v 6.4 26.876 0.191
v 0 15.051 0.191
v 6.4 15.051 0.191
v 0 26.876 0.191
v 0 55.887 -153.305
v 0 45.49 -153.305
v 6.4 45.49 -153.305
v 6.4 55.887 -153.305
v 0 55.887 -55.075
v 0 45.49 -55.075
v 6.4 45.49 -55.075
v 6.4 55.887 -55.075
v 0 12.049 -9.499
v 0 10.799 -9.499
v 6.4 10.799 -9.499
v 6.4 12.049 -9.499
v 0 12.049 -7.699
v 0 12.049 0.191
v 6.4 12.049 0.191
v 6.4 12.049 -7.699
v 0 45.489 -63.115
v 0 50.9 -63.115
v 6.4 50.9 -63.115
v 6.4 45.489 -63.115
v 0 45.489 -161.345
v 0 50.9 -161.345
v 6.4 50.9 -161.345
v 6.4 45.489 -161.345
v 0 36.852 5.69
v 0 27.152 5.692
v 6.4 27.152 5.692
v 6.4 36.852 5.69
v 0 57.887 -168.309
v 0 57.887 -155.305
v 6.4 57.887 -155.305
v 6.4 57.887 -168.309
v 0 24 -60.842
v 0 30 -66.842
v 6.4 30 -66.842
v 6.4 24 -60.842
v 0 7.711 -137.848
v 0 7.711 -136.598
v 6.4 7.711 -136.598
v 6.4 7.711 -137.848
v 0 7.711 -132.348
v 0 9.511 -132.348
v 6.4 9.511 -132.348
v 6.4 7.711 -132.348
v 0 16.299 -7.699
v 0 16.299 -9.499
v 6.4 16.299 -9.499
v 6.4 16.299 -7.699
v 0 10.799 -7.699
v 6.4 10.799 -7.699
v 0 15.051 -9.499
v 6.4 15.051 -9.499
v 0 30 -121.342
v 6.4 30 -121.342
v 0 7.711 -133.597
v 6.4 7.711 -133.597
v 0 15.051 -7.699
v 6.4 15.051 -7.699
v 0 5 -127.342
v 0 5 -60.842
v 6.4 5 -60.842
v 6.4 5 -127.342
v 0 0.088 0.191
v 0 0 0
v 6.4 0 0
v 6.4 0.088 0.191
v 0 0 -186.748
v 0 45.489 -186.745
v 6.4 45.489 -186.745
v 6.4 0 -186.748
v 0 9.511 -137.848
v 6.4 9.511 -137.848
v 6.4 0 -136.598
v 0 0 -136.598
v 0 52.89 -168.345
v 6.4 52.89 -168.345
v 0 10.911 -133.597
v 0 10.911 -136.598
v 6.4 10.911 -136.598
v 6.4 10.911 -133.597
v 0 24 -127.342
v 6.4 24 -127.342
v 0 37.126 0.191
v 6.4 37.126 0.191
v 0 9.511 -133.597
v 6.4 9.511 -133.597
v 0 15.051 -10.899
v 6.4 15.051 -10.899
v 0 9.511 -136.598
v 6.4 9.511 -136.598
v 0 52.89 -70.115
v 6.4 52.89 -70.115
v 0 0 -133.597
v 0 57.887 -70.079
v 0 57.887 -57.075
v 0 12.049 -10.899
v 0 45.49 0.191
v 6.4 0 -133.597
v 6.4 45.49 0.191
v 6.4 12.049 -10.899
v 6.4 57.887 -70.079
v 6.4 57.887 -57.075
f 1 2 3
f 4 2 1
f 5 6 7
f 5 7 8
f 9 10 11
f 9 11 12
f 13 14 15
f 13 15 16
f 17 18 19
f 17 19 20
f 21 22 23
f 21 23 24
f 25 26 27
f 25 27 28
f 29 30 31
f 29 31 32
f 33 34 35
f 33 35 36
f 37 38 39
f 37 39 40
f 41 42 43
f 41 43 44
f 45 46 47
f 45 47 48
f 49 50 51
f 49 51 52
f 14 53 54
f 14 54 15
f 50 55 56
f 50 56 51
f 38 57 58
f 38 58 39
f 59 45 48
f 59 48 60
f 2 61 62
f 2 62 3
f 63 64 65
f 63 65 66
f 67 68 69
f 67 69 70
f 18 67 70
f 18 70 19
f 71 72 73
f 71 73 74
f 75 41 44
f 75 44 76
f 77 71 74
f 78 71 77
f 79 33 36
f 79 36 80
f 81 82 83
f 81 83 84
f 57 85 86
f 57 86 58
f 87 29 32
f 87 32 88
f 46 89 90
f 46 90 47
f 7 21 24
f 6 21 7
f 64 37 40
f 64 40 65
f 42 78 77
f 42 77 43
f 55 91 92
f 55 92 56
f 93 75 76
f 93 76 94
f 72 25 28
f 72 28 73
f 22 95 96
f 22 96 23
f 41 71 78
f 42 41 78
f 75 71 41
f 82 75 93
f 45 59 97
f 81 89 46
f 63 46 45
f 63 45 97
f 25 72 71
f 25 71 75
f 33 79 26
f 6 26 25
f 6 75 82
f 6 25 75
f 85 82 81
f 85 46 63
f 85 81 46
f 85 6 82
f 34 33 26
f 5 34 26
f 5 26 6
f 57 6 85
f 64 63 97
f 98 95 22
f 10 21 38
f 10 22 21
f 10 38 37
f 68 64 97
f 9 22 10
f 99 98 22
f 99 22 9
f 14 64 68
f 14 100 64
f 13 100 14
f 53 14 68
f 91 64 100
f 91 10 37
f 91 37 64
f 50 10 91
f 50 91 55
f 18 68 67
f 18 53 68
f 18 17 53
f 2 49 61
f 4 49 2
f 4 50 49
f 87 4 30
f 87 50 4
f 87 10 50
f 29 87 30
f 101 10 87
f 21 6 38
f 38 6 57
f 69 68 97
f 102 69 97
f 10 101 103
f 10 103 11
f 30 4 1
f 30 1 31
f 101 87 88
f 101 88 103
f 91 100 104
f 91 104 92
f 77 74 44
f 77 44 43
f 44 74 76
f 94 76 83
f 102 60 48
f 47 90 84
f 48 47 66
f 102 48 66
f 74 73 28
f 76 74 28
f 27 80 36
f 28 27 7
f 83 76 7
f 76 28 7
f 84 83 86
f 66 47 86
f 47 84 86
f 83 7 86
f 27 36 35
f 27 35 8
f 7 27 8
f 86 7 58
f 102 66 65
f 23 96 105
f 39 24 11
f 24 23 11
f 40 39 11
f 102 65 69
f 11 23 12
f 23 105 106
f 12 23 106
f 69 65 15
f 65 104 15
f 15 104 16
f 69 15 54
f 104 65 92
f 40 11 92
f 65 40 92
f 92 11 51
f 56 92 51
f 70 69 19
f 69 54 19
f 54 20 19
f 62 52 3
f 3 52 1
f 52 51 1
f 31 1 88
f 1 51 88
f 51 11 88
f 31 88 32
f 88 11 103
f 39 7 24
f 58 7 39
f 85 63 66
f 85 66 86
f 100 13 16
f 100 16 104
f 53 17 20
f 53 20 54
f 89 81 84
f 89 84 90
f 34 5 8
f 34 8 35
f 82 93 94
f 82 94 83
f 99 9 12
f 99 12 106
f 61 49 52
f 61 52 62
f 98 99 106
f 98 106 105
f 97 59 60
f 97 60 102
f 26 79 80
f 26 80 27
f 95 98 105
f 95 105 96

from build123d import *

# Parameters (mm, degrees)
BOSS_EXTRUDE1_DEPTH = 6.4


with BuildPart() as part:
    # Sketch1 → Boss-Extrude1 (new body)
    with BuildSketch(Plane(origin=(0, 0, 0), x_dir=(0, 0, -1), z_dir=(1, 0, 0))):
        Polygon((7.699451661, 16.299320413), (7.699451661, 15.050679587), (-0.190789953, 15.050679587), (-0.190789953, 26.875784077), (-5.692060153, 27.152292188), (-5.689519376, 36.852291855), (-0.190789953, 37.125784431), (-0.190789953, 45.489990555), (55.075, 45.489990555), (55.075, 55.887449255), (57.075, 57.887449255), (70.079421798, 57.887449255), (70.115, 52.889990555), (63.115, 50.9), (63.115, 45.489442951), (153.305, 45.490143945), (153.305, 55.887449255), (155.305, 57.887449255), (168.309421798, 57.887449255), (168.345, 52.889990555), (161.345, 50.9), (161.345, 45.489442951), (186.745000058, 45.489442951), (186.748098344, 0), (136.598098344, 0), (136.598098344, 7.7113021), (137.848098344, 7.7113021), (137.848098344, 9.5113021), (136.598098344, 9.5113021), (136.598098344, 10.9113021), (133.59673917, 10.9113021), (133.59673917, 9.5113021), (132.348098344, 9.5113021), (132.348098344, 7.7113021), (133.59673917, 7.7113021), (133.59673917, 0), (118.842364298, 0), (73.842364298, 0), (0, 0), (-0.190789953, 0.087763288), (-0.190789953, 12.049320413), (7.699451661, 12.049320413), (7.699451661, 10.799320413), (9.499451661, 10.799320413), (9.499451661, 12.049320413), (10.899451661, 12.049320413), (10.899451661, 15.050679587), (9.499451661, 15.050679587), (9.499451661, 16.299320413), align=None)
        Polygon((60.842364298, 5), (127.342364298, 5), (127.342364298, 24), (121.342364298, 30), (66.842364298, 30), (60.842364298, 24), align=None, mode=Mode.SUBTRACT)
    extrude(amount=BOSS_EXTRUDE1_DEPTH)


solid = part.part
